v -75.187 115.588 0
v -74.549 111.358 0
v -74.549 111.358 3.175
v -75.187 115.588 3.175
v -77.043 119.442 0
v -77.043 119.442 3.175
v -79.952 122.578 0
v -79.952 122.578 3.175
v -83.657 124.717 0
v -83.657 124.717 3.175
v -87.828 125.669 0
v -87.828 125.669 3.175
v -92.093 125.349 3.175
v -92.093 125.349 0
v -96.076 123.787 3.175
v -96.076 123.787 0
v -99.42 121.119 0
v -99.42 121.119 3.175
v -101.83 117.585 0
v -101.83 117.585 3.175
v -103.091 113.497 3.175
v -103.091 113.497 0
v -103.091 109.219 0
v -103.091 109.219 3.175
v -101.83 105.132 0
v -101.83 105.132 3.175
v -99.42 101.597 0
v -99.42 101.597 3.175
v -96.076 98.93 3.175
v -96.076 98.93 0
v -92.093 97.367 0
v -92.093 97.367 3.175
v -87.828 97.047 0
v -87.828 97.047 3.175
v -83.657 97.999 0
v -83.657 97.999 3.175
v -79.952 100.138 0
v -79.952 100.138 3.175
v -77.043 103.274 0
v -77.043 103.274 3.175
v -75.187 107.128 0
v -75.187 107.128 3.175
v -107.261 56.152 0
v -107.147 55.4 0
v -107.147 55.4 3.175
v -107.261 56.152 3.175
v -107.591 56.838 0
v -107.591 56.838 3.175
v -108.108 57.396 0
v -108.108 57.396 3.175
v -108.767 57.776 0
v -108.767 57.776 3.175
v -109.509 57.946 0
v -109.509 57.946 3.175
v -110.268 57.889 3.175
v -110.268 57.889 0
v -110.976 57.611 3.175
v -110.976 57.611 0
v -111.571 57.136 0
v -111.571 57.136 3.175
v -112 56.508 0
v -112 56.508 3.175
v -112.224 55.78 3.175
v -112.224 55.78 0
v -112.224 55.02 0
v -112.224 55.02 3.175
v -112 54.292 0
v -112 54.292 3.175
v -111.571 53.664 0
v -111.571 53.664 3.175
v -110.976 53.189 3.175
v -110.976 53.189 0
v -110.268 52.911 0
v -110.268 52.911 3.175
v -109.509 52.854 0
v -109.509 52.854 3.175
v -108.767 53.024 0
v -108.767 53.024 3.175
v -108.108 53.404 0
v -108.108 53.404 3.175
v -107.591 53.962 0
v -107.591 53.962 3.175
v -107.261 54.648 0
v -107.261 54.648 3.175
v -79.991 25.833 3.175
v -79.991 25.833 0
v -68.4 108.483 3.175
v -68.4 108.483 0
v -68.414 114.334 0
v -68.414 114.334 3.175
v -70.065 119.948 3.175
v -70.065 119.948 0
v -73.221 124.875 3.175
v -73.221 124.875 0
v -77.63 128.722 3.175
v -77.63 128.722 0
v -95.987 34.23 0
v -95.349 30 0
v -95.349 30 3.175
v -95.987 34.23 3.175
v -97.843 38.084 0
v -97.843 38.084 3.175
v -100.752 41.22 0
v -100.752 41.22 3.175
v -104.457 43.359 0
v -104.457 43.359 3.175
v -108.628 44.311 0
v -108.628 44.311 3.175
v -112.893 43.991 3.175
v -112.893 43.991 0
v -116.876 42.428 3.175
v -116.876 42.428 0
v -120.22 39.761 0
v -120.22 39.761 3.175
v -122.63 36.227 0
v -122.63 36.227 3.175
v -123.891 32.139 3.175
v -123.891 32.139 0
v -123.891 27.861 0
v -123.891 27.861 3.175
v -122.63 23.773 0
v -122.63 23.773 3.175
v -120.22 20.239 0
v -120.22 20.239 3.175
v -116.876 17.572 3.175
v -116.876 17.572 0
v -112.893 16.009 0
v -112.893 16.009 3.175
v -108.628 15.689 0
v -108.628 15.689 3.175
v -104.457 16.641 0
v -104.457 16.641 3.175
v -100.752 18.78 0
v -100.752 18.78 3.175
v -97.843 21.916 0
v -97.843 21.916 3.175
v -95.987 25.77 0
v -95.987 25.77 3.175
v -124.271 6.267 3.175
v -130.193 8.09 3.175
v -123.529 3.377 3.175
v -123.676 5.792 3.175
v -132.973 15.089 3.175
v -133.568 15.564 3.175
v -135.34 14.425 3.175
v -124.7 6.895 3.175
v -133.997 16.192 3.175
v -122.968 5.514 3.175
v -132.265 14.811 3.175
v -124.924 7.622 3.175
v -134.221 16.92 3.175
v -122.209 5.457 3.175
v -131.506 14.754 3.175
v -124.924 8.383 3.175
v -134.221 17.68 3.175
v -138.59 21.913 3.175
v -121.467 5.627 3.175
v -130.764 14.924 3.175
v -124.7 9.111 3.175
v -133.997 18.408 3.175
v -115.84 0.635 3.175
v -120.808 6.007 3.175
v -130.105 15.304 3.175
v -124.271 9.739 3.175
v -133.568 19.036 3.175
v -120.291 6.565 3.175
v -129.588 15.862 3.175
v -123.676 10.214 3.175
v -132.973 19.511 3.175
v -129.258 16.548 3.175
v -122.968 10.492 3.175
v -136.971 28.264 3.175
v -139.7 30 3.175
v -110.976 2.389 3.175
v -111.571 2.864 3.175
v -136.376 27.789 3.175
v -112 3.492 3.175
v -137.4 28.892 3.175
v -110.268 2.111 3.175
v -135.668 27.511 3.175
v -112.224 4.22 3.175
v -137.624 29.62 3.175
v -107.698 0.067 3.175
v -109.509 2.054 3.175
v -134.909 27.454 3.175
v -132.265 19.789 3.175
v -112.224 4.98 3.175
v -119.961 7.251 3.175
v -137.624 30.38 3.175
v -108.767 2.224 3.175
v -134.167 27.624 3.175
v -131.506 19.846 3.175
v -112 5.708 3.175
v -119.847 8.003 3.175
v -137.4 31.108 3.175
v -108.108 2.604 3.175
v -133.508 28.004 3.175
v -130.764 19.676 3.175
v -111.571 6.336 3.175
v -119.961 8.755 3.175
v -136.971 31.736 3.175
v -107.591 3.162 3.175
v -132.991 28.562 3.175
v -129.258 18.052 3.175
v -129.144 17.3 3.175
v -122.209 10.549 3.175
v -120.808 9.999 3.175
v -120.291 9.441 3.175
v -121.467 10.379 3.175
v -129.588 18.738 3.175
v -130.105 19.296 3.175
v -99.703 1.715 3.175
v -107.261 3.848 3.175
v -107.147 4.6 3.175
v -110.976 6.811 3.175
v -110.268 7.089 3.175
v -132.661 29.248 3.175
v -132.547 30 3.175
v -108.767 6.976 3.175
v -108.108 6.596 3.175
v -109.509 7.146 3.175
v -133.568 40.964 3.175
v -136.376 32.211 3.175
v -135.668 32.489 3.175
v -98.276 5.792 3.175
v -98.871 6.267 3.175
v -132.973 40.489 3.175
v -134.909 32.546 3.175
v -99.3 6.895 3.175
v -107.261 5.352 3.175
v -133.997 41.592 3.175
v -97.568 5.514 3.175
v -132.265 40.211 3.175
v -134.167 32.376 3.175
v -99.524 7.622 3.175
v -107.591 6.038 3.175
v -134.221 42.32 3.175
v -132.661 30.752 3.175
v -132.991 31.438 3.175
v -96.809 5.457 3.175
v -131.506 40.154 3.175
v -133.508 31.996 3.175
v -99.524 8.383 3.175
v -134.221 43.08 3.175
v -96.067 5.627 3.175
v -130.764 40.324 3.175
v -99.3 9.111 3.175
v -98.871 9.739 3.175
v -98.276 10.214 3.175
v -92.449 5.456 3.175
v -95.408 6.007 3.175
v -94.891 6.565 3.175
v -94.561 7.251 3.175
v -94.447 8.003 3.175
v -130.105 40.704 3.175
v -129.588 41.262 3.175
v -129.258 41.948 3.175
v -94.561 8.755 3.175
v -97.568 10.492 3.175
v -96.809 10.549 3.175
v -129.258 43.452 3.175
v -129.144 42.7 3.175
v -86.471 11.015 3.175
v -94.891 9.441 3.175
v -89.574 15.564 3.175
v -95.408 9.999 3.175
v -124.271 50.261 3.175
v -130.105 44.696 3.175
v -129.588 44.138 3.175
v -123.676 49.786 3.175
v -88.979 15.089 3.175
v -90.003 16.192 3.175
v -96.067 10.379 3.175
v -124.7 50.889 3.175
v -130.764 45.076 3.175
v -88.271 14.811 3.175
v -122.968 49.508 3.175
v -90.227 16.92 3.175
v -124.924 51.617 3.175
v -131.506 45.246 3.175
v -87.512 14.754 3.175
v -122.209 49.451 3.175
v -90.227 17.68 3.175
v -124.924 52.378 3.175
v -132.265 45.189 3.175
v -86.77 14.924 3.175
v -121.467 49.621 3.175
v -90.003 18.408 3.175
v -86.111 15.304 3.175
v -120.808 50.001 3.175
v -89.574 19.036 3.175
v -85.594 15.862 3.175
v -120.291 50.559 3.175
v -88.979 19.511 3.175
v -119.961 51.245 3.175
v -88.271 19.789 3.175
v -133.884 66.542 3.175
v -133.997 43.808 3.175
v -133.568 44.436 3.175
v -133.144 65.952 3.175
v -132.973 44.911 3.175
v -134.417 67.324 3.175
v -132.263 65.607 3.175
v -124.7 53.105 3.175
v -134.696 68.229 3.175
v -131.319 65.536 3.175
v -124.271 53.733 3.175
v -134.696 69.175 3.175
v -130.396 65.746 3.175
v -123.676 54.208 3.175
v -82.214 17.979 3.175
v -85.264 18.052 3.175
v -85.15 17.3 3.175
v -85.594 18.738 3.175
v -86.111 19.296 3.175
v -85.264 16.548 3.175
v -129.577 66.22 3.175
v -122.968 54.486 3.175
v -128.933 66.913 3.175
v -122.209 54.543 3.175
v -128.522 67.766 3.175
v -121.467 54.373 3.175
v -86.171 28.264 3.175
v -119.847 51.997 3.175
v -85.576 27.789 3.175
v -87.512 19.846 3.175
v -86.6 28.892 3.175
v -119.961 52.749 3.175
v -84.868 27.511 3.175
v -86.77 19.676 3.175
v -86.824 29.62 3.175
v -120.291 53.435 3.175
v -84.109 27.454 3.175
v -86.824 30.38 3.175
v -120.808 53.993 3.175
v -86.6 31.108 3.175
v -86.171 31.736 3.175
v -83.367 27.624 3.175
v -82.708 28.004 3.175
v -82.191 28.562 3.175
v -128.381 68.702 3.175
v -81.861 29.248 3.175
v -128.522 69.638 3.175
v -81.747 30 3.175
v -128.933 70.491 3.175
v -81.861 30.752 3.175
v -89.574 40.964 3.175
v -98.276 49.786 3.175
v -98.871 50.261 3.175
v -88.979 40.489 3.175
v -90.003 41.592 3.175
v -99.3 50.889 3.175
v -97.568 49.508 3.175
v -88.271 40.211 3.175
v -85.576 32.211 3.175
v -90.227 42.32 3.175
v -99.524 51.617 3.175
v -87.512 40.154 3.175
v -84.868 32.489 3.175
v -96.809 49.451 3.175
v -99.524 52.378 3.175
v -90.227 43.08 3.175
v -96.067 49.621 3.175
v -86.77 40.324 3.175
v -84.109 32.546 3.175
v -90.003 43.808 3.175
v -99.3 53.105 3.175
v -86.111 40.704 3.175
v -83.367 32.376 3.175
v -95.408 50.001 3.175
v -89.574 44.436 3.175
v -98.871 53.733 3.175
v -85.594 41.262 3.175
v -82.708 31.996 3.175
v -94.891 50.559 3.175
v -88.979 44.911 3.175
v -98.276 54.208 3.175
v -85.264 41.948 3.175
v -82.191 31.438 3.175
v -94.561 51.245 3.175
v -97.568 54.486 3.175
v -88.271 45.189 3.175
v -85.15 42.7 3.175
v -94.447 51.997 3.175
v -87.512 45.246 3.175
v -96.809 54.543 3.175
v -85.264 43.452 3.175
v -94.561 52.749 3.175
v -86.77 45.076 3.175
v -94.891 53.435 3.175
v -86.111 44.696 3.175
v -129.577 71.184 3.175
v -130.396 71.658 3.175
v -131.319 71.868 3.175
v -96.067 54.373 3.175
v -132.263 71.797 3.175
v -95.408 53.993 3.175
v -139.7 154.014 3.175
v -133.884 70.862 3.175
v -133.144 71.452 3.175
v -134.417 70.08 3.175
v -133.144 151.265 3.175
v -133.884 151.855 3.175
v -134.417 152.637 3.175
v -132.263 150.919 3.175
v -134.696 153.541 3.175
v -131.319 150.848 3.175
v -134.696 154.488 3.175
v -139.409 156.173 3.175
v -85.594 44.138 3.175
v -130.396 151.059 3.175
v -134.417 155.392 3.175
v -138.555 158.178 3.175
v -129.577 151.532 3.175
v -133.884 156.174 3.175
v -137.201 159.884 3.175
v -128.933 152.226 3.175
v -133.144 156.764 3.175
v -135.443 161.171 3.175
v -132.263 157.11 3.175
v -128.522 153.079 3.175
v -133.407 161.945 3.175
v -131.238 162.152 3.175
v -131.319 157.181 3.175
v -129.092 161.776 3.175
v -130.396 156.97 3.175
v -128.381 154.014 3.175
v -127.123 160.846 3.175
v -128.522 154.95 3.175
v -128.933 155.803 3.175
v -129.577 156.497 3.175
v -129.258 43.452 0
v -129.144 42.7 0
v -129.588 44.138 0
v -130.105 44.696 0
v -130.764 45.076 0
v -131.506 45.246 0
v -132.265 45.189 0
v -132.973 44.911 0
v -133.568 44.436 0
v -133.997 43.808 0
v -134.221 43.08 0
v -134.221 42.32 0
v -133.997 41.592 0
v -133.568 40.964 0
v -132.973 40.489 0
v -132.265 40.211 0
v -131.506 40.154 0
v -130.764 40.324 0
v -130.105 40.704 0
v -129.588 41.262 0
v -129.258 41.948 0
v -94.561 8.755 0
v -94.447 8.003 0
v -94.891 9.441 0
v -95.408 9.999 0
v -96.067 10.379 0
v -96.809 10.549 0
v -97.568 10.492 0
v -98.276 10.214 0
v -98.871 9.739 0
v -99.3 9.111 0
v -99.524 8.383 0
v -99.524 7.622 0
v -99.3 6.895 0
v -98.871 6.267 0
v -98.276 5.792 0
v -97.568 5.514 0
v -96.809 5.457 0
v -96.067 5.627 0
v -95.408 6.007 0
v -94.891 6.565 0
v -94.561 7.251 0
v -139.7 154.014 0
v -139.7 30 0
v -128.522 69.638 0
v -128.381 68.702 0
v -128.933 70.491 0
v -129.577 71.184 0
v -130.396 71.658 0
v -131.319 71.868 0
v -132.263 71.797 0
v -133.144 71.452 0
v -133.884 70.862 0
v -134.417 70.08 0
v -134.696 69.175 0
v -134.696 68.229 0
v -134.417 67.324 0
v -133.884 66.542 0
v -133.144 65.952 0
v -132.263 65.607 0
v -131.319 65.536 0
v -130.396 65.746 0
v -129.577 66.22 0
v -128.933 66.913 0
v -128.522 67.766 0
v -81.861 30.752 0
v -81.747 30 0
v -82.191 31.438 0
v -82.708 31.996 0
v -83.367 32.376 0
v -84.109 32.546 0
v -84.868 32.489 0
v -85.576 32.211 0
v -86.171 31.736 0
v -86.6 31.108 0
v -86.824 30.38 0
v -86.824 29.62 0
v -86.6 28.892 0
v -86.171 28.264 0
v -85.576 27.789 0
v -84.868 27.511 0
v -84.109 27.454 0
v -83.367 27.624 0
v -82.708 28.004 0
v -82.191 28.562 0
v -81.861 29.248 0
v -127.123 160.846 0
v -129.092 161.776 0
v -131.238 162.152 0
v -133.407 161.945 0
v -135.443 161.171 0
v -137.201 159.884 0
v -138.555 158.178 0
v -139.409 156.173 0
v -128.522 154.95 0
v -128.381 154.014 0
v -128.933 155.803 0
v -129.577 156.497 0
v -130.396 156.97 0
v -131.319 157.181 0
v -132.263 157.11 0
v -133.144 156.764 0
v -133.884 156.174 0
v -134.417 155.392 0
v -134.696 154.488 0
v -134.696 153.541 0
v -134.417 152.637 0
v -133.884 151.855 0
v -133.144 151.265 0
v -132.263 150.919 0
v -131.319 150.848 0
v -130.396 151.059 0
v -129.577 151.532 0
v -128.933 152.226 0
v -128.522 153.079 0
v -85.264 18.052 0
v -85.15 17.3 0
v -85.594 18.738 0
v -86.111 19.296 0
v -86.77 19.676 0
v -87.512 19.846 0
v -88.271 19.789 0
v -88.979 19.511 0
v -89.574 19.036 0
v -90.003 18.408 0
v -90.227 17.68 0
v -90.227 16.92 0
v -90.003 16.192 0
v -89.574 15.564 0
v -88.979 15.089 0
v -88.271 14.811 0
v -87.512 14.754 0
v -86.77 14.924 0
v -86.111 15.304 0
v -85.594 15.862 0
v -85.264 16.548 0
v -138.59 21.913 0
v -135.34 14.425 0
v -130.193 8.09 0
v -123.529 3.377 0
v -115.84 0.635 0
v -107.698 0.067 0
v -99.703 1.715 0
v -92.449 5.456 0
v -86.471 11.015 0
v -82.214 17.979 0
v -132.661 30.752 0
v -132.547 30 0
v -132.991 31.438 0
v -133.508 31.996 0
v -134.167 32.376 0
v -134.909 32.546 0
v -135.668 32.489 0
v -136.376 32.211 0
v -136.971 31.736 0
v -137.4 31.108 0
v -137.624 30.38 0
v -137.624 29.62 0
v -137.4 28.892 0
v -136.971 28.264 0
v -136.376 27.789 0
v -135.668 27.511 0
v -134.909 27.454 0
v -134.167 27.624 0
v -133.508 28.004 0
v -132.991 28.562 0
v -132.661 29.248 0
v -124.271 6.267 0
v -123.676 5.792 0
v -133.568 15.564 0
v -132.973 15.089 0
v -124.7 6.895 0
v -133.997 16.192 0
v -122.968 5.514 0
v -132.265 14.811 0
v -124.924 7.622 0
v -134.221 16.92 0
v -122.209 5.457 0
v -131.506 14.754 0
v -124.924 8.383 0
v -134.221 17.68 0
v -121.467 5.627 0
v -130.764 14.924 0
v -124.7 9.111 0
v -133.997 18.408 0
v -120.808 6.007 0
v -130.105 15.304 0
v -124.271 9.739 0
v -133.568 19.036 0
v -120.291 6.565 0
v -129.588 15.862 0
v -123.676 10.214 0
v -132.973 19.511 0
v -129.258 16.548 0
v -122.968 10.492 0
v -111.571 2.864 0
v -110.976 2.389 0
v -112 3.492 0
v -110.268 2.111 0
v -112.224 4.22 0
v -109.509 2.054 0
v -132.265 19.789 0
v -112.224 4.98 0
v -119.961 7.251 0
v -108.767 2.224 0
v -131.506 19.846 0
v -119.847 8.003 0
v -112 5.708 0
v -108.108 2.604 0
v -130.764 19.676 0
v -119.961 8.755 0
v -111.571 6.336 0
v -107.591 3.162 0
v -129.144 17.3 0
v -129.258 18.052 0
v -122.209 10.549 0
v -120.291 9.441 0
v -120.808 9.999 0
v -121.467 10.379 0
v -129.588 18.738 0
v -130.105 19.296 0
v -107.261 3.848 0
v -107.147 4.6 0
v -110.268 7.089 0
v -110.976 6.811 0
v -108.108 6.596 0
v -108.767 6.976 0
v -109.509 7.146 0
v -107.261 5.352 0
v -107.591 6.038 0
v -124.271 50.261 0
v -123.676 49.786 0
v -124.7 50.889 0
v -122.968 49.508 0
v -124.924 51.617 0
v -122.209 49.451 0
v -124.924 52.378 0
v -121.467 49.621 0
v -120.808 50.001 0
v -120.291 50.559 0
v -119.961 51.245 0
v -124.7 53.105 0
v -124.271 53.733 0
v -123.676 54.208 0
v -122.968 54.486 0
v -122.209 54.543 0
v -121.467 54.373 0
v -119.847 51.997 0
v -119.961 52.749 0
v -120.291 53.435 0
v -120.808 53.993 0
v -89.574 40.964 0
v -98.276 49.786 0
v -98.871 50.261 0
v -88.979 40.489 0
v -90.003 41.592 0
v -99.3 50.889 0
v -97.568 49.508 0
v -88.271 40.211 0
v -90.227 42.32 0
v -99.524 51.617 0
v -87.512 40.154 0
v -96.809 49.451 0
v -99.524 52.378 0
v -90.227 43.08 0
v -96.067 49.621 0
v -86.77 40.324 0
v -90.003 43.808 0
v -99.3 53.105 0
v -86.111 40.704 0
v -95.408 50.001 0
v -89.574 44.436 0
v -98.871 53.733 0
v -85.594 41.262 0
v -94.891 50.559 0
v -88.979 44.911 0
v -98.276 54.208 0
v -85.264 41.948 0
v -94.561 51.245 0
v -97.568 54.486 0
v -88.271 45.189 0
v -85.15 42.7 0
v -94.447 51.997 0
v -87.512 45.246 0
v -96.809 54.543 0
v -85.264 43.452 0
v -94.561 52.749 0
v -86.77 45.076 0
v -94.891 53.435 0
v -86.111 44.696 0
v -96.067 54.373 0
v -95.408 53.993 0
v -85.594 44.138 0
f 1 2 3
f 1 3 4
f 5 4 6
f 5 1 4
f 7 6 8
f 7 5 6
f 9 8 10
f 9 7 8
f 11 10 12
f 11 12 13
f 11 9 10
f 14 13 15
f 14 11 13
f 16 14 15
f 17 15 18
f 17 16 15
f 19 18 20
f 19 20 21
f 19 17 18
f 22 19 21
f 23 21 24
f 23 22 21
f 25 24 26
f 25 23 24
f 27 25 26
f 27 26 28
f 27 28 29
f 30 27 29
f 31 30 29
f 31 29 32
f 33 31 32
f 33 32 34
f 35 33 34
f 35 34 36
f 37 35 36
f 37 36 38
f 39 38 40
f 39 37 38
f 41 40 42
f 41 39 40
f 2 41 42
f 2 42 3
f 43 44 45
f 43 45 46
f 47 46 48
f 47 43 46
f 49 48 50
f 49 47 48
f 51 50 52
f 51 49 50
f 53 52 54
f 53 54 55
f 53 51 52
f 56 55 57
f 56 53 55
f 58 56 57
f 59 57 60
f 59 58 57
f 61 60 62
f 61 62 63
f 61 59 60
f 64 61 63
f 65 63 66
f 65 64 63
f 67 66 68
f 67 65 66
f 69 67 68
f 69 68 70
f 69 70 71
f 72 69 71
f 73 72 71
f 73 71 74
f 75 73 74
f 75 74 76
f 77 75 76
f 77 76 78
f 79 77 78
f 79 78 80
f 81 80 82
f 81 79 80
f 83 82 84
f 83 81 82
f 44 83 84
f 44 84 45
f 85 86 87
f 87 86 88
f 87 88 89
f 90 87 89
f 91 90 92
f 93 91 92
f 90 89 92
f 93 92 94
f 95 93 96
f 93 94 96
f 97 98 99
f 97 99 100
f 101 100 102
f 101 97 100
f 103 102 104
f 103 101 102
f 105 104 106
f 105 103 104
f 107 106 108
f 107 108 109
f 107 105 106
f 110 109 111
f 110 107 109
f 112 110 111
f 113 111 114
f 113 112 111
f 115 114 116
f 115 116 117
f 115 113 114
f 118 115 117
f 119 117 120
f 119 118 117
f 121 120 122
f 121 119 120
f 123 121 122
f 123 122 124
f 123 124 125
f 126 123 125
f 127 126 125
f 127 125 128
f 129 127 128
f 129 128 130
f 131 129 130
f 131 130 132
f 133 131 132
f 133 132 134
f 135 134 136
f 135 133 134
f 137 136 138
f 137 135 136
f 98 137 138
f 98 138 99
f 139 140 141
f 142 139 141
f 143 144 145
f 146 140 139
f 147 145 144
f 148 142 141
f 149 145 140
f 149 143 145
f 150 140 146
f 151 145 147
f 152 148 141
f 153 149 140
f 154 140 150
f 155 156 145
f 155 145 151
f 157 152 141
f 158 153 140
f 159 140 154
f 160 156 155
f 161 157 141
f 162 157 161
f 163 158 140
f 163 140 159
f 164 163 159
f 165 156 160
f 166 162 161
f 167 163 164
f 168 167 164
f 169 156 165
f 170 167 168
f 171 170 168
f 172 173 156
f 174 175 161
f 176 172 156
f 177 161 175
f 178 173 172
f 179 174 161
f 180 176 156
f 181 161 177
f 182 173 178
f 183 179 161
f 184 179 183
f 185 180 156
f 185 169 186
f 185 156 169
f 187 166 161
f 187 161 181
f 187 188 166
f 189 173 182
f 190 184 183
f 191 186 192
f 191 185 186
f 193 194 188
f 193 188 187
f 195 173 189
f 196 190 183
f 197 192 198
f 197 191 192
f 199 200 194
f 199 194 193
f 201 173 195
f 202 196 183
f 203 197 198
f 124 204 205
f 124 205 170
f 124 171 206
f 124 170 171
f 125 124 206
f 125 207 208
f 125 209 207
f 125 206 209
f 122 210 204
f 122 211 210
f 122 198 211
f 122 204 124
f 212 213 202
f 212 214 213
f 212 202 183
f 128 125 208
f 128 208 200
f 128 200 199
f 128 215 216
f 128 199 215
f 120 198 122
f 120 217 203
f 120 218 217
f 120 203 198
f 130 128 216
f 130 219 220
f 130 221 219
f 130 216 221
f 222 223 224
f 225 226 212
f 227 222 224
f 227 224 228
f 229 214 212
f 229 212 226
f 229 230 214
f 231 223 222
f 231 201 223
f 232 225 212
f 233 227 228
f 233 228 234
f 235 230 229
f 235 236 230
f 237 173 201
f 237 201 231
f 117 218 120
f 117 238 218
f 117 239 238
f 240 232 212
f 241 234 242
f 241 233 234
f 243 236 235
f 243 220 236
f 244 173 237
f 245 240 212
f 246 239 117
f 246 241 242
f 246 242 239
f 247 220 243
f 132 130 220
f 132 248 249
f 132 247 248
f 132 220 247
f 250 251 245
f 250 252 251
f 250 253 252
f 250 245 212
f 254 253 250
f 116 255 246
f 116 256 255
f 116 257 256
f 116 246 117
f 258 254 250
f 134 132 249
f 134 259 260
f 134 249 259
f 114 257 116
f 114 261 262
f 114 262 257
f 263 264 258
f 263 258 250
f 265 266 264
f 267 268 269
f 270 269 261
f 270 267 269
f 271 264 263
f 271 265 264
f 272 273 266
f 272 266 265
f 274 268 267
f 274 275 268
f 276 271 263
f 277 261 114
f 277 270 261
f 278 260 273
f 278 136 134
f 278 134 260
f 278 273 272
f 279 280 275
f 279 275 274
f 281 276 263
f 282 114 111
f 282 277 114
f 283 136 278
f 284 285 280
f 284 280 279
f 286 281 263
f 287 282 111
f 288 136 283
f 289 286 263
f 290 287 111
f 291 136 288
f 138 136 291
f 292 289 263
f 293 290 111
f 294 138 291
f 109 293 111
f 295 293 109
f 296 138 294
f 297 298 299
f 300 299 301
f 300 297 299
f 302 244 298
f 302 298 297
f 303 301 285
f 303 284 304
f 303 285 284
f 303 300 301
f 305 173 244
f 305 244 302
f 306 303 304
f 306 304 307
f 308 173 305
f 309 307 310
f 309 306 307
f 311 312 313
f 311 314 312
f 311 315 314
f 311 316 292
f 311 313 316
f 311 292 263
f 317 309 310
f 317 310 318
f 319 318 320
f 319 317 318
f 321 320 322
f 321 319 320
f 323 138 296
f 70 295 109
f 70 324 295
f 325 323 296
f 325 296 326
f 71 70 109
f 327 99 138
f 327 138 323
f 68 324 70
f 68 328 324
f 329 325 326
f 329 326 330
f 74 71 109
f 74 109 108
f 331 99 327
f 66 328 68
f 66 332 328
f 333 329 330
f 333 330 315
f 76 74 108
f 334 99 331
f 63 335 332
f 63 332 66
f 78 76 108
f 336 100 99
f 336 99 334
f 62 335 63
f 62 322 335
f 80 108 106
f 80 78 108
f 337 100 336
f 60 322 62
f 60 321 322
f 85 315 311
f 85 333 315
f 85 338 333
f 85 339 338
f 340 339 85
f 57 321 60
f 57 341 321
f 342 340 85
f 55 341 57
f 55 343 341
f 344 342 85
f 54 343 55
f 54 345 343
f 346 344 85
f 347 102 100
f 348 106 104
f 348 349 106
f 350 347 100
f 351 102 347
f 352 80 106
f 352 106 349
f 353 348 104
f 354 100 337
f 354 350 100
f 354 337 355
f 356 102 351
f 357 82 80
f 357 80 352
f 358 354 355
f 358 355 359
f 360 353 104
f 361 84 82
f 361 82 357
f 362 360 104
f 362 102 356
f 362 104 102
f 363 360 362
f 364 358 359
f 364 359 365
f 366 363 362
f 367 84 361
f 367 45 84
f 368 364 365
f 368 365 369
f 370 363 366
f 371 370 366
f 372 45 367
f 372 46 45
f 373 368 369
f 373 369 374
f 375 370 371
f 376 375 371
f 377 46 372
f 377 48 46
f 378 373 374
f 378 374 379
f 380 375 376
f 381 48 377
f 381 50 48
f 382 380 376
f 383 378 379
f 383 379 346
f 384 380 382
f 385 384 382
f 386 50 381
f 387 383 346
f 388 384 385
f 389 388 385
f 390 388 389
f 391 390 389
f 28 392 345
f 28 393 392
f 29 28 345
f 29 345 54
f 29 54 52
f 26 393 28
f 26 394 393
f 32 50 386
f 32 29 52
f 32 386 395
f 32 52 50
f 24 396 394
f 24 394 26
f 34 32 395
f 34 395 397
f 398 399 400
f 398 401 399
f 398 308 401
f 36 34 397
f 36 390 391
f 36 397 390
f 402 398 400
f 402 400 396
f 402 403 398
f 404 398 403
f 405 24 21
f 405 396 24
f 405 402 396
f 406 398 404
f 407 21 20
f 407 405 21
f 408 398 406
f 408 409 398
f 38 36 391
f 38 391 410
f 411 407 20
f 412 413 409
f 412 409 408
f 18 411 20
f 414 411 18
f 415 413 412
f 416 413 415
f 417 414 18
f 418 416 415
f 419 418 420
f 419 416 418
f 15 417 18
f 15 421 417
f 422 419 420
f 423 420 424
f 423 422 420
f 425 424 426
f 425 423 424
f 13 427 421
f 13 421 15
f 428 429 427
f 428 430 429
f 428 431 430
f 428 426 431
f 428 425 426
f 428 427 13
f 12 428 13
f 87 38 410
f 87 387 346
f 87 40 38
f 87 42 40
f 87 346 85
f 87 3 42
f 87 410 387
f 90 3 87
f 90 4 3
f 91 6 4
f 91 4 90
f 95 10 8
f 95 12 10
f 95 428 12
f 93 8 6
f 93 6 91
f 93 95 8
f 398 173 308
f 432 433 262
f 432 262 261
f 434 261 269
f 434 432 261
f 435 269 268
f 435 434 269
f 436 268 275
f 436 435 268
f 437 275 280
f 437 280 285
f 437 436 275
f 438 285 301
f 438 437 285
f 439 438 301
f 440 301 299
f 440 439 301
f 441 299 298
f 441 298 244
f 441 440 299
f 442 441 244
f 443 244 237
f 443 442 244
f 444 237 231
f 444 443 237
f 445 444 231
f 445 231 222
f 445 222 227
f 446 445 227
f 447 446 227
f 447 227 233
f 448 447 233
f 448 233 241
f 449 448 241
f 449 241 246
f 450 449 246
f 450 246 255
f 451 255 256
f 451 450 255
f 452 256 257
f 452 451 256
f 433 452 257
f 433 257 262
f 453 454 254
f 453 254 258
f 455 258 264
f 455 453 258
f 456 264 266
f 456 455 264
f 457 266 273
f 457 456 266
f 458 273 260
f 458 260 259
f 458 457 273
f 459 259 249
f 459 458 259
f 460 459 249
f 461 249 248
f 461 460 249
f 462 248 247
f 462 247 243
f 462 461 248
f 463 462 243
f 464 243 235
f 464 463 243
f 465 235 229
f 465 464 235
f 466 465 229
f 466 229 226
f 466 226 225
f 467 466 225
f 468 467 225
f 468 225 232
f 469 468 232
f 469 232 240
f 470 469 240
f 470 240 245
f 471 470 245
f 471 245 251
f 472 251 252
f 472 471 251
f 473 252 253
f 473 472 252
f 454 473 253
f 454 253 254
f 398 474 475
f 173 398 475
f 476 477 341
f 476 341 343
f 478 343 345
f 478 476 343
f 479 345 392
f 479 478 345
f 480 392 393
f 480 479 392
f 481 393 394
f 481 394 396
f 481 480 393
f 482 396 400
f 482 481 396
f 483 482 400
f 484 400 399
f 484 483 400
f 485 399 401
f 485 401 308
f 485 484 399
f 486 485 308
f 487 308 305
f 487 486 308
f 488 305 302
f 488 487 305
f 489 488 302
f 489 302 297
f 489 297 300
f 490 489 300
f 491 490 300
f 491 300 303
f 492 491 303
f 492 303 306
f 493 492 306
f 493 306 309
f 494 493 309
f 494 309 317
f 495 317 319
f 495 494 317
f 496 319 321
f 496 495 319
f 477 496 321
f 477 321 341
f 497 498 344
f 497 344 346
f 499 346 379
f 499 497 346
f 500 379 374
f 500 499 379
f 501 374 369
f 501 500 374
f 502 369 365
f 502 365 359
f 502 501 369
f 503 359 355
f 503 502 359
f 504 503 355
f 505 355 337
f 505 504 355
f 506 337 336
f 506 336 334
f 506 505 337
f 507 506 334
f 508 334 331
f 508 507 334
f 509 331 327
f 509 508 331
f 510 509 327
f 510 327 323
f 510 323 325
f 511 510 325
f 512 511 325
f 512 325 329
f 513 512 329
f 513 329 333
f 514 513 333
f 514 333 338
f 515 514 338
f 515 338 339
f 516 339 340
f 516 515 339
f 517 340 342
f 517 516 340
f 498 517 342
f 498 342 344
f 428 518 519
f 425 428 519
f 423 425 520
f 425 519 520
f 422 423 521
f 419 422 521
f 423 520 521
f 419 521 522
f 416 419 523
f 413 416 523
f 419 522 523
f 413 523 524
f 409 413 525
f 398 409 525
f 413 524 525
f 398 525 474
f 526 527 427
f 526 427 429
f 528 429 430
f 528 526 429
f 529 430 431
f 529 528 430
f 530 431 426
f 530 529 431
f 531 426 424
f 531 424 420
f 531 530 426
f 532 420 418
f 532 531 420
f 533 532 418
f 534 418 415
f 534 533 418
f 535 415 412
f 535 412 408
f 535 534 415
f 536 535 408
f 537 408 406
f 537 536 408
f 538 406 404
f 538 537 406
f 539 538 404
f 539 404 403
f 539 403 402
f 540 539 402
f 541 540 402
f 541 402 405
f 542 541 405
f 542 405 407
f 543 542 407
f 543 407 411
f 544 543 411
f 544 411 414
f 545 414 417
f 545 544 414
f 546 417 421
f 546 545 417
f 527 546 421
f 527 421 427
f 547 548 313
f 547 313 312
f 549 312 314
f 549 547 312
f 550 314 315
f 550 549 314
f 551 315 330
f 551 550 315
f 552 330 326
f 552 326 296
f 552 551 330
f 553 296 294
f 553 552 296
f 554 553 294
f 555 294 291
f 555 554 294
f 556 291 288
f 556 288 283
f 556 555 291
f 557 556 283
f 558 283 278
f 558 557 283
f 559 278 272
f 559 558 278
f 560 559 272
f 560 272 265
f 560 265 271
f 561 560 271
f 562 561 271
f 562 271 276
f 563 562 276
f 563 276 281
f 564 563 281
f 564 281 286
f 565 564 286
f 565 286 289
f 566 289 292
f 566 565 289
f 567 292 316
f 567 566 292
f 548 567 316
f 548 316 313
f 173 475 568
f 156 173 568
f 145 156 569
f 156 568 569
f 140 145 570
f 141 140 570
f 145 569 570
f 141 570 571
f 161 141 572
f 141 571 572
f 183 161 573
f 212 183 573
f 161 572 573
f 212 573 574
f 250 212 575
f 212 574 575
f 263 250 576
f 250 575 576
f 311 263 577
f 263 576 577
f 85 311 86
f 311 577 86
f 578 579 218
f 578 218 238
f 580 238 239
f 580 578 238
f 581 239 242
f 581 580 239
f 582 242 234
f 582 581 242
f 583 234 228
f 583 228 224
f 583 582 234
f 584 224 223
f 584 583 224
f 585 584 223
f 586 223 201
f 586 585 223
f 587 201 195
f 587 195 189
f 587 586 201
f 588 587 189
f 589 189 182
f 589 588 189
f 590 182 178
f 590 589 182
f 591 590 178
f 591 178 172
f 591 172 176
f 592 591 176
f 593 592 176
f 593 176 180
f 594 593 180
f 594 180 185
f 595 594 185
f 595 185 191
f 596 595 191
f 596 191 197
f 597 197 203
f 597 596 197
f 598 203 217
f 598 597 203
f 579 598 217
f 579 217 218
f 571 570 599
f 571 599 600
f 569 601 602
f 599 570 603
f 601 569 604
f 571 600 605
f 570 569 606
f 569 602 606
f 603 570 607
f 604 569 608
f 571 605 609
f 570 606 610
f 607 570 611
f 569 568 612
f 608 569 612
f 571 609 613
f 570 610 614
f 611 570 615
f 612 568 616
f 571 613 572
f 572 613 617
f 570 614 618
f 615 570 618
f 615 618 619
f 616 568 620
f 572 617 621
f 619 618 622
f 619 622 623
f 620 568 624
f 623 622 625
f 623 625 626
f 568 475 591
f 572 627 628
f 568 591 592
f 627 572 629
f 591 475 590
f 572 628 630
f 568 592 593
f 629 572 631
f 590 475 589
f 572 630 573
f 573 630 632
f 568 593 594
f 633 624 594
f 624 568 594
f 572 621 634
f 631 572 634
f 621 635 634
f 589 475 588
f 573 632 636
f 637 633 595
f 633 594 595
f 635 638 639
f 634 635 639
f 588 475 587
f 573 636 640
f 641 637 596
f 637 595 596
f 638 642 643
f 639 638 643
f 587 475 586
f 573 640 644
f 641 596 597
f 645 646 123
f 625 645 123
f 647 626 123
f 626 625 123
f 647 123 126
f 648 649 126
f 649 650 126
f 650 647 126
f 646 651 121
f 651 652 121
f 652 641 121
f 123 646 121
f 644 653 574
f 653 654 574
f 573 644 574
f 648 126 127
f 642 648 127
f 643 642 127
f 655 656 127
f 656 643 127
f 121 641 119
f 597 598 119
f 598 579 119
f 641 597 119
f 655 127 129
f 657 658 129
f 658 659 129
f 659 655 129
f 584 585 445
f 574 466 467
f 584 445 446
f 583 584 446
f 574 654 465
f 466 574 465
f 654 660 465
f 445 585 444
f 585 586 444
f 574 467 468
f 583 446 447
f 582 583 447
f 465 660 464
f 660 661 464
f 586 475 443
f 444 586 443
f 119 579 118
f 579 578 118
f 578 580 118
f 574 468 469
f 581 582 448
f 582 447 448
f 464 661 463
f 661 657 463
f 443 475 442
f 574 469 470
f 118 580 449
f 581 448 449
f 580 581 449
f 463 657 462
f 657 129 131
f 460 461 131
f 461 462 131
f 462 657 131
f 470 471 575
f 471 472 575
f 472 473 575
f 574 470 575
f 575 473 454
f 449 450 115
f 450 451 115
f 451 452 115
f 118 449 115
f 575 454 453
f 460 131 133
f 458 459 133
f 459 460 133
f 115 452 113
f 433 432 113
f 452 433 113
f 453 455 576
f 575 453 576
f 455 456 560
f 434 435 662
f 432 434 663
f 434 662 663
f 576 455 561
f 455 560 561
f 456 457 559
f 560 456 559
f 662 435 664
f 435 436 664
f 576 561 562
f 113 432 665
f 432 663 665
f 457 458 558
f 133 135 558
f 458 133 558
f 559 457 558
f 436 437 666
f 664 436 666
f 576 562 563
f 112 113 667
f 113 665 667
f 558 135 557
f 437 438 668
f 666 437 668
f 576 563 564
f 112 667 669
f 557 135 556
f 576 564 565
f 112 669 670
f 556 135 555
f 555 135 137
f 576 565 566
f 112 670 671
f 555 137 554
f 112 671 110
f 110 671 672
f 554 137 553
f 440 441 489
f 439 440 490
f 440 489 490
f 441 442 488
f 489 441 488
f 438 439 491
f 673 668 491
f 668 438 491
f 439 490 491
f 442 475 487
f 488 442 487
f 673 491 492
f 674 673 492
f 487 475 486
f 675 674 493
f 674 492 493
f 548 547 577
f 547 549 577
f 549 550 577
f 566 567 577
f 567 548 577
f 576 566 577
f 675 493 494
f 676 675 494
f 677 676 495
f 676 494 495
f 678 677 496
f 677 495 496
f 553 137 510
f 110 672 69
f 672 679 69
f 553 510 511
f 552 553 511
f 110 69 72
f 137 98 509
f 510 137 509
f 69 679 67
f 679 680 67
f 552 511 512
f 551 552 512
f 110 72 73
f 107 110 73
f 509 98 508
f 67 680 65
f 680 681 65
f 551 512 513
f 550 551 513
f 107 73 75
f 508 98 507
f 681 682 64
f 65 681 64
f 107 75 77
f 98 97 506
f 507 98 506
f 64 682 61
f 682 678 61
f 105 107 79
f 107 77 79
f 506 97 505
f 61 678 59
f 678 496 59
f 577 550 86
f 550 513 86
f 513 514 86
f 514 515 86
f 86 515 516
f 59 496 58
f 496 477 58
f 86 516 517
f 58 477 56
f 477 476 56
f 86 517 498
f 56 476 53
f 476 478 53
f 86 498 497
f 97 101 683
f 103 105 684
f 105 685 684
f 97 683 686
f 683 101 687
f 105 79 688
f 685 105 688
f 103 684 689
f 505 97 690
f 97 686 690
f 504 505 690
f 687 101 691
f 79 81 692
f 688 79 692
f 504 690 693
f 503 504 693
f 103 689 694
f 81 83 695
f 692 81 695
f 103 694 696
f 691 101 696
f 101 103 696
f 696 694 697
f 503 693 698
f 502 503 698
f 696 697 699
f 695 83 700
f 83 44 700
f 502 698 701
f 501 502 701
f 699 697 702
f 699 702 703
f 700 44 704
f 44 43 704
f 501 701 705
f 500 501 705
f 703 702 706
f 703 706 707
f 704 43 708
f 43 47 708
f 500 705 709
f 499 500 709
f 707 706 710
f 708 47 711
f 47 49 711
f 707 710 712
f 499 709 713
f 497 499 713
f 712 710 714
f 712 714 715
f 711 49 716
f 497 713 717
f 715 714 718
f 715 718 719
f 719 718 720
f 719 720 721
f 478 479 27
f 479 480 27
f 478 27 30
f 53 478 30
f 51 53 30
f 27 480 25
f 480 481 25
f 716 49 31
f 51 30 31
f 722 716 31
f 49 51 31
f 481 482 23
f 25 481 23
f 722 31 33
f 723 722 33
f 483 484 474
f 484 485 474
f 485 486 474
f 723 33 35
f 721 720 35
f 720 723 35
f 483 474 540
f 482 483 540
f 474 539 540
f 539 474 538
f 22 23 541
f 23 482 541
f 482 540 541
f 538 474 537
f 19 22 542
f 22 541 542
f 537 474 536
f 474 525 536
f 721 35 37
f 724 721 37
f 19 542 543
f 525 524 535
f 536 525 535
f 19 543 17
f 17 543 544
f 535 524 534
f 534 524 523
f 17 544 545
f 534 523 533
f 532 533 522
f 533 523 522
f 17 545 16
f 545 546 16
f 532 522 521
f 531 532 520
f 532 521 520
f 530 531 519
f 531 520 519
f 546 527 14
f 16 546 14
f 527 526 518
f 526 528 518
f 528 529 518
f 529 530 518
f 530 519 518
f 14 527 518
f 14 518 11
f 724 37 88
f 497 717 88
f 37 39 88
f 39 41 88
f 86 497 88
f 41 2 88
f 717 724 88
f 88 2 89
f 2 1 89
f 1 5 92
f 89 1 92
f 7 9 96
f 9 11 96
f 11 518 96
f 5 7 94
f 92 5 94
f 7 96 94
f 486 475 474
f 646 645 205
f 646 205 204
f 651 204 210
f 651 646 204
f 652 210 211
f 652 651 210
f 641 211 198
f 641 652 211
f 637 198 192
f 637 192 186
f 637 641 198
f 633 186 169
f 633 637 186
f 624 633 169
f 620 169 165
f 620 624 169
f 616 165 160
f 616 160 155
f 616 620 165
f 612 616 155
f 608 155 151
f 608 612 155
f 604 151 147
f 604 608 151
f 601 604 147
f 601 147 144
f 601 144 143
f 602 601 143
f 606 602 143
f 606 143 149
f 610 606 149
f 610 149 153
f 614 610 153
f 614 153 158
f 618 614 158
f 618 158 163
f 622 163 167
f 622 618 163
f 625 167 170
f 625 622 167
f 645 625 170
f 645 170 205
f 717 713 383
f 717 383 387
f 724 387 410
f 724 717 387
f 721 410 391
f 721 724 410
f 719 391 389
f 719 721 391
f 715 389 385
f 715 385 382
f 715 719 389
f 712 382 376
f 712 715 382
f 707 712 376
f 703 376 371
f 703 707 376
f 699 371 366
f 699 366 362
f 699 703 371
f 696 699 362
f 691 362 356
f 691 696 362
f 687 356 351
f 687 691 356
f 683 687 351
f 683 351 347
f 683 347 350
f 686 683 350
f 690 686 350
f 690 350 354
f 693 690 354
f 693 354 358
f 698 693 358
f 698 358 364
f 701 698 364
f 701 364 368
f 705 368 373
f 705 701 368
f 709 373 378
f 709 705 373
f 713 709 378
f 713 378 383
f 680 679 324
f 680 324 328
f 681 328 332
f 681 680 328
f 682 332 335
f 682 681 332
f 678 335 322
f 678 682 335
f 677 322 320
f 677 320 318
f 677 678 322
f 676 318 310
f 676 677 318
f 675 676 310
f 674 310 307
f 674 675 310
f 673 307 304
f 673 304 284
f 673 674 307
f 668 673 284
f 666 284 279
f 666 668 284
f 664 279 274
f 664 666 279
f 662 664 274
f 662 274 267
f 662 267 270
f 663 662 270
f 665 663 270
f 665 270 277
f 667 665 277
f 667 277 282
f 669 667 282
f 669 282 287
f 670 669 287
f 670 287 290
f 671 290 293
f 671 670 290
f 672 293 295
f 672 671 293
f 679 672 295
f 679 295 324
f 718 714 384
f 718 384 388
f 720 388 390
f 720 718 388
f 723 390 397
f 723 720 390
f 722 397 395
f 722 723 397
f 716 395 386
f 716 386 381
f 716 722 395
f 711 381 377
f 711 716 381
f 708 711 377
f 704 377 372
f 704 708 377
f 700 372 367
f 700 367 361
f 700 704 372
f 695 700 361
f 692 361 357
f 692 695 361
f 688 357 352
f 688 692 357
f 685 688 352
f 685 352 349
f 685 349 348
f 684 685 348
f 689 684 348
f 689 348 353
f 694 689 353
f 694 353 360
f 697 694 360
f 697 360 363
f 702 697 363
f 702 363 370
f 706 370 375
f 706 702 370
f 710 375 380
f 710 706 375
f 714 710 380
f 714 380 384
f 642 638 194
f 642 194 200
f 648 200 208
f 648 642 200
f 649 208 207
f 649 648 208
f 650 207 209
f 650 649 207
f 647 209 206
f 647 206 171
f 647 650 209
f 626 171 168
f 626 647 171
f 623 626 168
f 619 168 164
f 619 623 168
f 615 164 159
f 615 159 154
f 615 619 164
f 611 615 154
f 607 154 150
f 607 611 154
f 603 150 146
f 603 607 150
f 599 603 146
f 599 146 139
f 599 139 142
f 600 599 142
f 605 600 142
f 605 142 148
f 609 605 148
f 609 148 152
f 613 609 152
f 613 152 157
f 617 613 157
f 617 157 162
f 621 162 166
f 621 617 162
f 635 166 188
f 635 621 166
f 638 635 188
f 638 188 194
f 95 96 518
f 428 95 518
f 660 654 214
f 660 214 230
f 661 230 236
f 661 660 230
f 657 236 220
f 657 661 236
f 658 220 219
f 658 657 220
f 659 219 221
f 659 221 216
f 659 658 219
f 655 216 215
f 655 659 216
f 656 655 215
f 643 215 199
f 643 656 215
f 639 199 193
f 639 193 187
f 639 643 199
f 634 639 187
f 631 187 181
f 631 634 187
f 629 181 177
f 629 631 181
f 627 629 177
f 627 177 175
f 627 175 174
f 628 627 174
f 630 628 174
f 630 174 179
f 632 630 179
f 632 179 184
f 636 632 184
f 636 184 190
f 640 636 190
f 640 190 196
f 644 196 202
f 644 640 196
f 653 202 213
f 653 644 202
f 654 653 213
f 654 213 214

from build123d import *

# Parameters (mm, degrees)
SKETCH2_R           = 14.351
SKETCH2_R_2         = 2.5527
SKETCH2_R_3         = 3.175
BOSS_EXTRUDE1_DEPTH = 3.175


with BuildPart() as part:
    # Sketch2 → Boss-Extrude1 (new body)
    with BuildSketch(Plane.XY):
        with BuildLine():
            Line((-139.7, 154.014440652), (-139.7, 30))
            ThreePointArc((-139.7, 30), (-111.788337372, 0.072774151), (-79.990743532, 25.833457055))
            Line((-79.990743532, 25.833457055), (-68.399622728, 108.48317056))
            ThreePointArc((-68.399622728, 108.48317056), (-70.065229263, 119.947916289), (-77.629824678, 128.72239838))
            Line((-77.629824678, 128.72239838), (-127.122524146, 160.845515232))
            ThreePointArc((-127.122524146, 160.845515232), (-135.443000435, 161.170844756), (-139.7, 154.014440652))
        make_face()
        with Locations((-88.9, 111.358224077)):
            Circle(SKETCH2_R, mode=Mode.SUBTRACT)
        with Locations((-109.7, 55.4)):
            Circle(SKETCH2_R_2, mode=Mode.SUBTRACT)
        with Locations((-97, 51.997045256)):
            Circle(SKETCH2_R_2, mode=Mode.SUBTRACT)
        with Locations((-87.702954744, 42.7)):
            Circle(SKETCH2_R_2, mode=Mode.SUBTRACT)
        with Locations((-84.3, 30)):
            Circle(SKETCH2_R_2, mode=Mode.SUBTRACT)
        with Locations((-87.702954744, 17.3)):
            Circle(SKETCH2_R_2, mode=Mode.SUBTRACT)
        with Locations((-97, 8.002954744)):
            Circle(SKETCH2_R_2, mode=Mode.SUBTRACT)
        with Locations((-109.7, 4.6)):
            Circle(SKETCH2_R_2, mode=Mode.SUBTRACT)
        with Locations((-122.4, 8.002954744)):
            Circle(SKETCH2_R_2, mode=Mode.SUBTRACT)
        with Locations((-131.697045256, 17.3)):
            Circle(SKETCH2_R_2, mode=Mode.SUBTRACT)
        with Locations((-135.1, 30)):
            Circle(SKETCH2_R_2, mode=Mode.SUBTRACT)
        with Locations((-131.697045256, 42.7)):
            Circle(SKETCH2_R_2, mode=Mode.SUBTRACT)
        with Locations((-122.4, 51.997045256)):
            Circle(SKETCH2_R_2, mode=Mode.SUBTRACT)
        with Locations((-109.7, 30)):
            Circle(SKETCH2_R, mode=Mode.SUBTRACT)
        with Locations((-131.556216575, 68.702007502)):
            Circle(SKETCH2_R_3, mode=Mode.SUBTRACT)
        with Locations((-131.556216575, 154.014440652)):
            Circle(SKETCH2_R_3, mode=Mode.SUBTRACT)
    extrude(amount=BOSS_EXTRUDE1_DEPTH)


solid = part.part
